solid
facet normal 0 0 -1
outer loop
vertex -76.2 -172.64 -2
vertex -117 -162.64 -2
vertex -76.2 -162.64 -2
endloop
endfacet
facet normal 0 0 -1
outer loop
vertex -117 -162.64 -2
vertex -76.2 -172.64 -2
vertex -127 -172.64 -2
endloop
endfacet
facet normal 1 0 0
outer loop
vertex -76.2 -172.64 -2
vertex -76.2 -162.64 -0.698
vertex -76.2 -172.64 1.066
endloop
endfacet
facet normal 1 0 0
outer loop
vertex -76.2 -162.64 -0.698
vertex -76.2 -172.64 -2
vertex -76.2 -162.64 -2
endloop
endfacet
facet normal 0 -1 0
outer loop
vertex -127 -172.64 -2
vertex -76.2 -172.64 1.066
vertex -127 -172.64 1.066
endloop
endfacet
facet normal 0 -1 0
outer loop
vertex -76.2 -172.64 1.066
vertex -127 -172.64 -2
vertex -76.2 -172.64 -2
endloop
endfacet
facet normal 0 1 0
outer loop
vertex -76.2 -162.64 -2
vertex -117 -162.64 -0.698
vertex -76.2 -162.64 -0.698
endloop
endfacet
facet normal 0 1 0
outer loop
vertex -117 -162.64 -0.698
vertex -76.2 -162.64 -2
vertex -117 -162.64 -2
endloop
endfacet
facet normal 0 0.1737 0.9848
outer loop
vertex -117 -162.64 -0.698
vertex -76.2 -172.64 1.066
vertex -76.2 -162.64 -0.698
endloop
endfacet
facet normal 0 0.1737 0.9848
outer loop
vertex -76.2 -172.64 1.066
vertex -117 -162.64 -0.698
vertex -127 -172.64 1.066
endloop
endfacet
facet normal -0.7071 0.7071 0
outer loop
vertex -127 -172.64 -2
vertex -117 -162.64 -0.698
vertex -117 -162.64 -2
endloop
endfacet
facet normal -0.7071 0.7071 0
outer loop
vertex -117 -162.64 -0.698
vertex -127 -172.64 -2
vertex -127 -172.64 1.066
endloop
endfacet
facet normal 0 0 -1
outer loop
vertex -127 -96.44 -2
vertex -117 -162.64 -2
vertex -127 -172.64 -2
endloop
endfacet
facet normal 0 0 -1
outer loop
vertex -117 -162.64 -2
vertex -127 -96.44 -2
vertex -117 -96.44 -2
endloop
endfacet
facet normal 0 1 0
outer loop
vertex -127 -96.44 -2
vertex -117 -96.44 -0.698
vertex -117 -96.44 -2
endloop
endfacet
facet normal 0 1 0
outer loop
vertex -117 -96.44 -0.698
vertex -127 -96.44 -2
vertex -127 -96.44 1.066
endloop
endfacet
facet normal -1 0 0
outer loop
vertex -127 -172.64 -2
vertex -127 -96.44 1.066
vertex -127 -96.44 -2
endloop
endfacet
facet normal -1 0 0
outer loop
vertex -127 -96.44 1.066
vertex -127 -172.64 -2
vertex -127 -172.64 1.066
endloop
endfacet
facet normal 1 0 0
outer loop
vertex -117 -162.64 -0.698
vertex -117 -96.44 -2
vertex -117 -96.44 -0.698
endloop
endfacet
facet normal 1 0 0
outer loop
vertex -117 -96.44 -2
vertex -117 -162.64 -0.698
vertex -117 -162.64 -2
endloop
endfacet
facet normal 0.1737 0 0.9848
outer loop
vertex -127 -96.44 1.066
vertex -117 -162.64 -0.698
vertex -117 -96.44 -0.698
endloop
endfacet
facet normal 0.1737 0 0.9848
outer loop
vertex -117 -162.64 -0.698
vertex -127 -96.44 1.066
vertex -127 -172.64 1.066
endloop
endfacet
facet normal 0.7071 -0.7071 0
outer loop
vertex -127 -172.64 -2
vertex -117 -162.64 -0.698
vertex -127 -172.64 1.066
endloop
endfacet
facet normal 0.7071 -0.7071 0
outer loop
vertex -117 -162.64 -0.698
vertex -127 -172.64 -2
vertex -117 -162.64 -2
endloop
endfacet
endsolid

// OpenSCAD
// Picture frame files
//


fr_w = 4*25.4;
fr_h = 6*25.4;
fr_th = 4;
fr_d = 10;

module bevel_cube_1(x,y,z)
{
    difference()
    {
       cube([x, y, z], center=true);
        translate([0, -y/2, z/3])
       rotate([10, 0,0])
       cube([x+10, y*3, z], center=true);
    }
    
}

module bevel_cube(x, y, z)
{
difference()
    {
        bevel_cube_1(x, y, z);
        translate([x/2+y/sqrt(2)-y, -y/2, 0])
       rotate([0, 0, -45+90])
       cube([x, y, z*2], center=true);
        
    }
}

module corner1()
{
bevel_cube(fr_w/2, fr_d, fr_th);
    translate([fr_w/4-fr_d/2, -fr_h/4+fr_d/2, 0])
    mirror([1,0,0])
    rotate([0,0,90])
bevel_cube(fr_h/2, fr_d, fr_th);
}



c=4;

if( c==1)
{
corner1();
}

if(c==2)
{
    
translate([0, -fr_h*1.1, 0])
mirror([0,1,0])
corner1();
}

translate([-fr_w, 0,0])
mirror([1,0,0])
{
if(c==3)
{
corner1();
}

if(c==4)
{
translate([0, -fr_h*1.1, 0])
mirror([0,1,0])
corner1();
}
}
